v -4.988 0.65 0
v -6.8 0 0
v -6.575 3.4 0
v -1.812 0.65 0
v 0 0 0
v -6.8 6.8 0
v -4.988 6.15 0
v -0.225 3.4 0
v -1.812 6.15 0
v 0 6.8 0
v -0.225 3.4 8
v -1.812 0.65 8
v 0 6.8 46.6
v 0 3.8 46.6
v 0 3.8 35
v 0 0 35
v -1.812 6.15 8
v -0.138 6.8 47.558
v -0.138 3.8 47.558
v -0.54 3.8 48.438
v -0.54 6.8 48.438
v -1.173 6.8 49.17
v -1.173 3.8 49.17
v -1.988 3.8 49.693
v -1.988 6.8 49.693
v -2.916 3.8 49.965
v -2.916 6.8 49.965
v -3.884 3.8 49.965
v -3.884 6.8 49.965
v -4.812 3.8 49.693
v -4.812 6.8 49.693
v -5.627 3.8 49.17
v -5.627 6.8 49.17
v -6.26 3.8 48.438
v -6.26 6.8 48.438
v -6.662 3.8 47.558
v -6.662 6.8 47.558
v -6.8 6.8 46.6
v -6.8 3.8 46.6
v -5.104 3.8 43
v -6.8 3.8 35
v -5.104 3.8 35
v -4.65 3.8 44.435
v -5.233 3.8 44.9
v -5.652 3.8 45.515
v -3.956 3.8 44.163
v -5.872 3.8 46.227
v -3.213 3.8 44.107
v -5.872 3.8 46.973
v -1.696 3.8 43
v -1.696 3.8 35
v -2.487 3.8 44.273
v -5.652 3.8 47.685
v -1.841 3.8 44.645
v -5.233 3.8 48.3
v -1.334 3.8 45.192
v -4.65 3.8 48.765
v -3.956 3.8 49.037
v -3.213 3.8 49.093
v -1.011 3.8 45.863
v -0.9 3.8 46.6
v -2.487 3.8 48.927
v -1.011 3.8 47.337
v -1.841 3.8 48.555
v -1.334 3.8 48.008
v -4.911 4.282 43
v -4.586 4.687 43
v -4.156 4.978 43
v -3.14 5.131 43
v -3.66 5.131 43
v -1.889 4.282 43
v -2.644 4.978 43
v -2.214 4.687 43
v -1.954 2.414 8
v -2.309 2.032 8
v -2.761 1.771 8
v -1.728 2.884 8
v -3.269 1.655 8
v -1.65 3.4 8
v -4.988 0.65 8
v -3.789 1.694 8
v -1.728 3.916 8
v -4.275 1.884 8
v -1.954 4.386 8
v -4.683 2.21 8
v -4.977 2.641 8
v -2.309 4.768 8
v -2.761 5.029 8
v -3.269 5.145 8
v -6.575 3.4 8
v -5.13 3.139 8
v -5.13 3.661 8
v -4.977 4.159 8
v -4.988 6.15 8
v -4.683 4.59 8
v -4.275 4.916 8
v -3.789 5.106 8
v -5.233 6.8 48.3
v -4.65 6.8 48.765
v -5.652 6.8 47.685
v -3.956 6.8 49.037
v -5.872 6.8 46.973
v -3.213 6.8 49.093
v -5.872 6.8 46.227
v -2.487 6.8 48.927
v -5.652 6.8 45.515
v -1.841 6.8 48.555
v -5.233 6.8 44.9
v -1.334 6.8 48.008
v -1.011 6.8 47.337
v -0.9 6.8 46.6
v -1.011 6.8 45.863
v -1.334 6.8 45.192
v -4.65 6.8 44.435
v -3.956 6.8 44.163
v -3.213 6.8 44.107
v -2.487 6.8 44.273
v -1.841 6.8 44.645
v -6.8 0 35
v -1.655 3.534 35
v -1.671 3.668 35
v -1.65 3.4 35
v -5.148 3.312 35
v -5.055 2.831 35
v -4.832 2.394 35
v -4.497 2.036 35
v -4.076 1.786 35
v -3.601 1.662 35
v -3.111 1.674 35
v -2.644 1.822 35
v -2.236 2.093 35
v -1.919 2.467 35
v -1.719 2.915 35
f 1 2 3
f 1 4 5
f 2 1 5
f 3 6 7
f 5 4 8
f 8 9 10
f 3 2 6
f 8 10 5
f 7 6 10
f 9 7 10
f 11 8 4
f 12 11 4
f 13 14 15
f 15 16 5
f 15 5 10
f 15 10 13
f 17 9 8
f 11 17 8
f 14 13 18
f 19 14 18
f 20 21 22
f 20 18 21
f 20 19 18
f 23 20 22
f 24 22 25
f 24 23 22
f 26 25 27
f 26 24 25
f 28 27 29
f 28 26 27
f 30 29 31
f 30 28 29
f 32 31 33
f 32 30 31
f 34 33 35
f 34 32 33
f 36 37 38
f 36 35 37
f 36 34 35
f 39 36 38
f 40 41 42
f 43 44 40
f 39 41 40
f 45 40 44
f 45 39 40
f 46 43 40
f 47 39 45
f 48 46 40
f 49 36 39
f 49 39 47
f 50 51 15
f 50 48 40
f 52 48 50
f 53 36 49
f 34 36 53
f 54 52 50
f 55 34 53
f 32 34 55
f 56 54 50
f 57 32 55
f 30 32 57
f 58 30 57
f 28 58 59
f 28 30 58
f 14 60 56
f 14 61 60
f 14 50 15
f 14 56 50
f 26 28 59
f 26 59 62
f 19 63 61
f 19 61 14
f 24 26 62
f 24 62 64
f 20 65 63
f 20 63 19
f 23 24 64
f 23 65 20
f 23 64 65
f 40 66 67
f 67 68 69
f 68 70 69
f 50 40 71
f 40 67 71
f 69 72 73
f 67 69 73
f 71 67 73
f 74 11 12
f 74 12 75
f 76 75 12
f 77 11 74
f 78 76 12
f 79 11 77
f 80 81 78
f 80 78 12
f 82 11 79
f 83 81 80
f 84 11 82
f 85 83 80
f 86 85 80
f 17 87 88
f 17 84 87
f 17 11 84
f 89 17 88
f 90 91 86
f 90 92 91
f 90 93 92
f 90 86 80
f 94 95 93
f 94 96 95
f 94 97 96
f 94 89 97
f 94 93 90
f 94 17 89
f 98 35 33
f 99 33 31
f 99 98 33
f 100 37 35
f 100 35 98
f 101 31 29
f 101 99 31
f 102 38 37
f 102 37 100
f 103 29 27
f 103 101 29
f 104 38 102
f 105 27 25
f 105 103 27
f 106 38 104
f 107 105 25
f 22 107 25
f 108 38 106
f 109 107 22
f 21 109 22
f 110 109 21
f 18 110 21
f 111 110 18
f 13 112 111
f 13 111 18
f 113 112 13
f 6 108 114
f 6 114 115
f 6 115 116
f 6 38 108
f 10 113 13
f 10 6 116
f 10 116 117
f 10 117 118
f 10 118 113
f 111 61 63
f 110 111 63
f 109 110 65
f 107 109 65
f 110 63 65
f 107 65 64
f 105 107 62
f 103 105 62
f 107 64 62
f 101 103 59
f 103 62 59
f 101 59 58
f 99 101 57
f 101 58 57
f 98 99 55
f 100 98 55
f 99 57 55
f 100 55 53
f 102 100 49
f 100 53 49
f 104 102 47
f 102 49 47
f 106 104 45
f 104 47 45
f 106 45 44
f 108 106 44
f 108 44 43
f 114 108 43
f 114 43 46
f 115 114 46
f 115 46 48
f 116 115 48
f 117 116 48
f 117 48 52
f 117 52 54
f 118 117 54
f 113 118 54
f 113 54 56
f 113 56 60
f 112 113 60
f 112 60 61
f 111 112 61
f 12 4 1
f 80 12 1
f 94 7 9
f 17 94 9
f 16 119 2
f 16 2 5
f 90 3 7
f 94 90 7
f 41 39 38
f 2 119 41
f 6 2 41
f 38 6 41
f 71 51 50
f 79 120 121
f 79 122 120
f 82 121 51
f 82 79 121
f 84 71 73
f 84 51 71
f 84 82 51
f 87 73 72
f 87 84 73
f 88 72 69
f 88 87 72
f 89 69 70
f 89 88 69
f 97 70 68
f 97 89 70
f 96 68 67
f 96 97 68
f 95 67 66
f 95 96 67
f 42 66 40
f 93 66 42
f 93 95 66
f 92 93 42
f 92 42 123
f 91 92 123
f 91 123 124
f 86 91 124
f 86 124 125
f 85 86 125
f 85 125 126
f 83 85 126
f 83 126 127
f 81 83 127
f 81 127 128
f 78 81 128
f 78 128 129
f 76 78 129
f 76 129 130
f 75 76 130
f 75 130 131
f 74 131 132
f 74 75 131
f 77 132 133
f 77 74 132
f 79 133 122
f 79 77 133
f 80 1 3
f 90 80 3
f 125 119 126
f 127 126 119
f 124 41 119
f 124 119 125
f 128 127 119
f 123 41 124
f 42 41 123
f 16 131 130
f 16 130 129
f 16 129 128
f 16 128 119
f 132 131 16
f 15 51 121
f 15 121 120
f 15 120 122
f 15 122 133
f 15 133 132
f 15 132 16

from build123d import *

# Parameters (mm, degrees)
SKETCH1_W           = 6.8
SKETCH1_H           = 6.8
SKETCH1_R           = 1.75
BOSS_EXTRUDE1_DEPTH = 50
CUT_EXTRUDE1_DEPTH  = 8
SKETCH5_W           = 6.8
SKETCH5_H           = 6.8
BOSS_EXTRUDE2_DEPTH = 7
SKETCH3_W           = 6.8
SKETCH3_H           = 3.8
CUT_EXTRUDE2_DEPTH  = 15
SKETCH4_R           = 2.5
CUT_EXTRUDE3_DEPTH  = 20
FILLET3_RADIUS      = 3.4
FILLET3_LENGTH      = 3


with BuildPart() as part:
    # Sketch1 → Boss-Extrude1 (new body)
    with BuildSketch(Plane.XY):
        with Locations((-3.4, 3.4)):
            Rectangle(SKETCH1_W, SKETCH1_H)
        with Locations((-3.4, 3.4)):
            Circle(SKETCH1_R, mode=Mode.SUBTRACT)
    extrude(amount=BOSS_EXTRUDE1_DEPTH)

    # Sketch2 → Cut-Extrude1 (cut)
    with BuildSketch(Plane(origin=(0, 0, 0), x_dir=(-1, 0, 0), z_dir=(0, 0, -1))):
        Polygon((6.575426481, 3.4), (4.98771324, 6.15), (1.81228676, 6.15), (0.224573519, 3.4), (1.81228676, 0.65), (4.98771324, 0.65), align=None)
    extrude(amount=-CUT_EXTRUDE1_DEPTH, mode=Mode.SUBTRACT)

    # Sketch5 → Boss-Extrude2 (add)
    with BuildSketch(Plane.XY.offset(50)):
        with Locations((-3.4, 3.4)):
            Rectangle(SKETCH5_W, SKETCH5_H)
    extrude(amount=-BOSS_EXTRUDE2_DEPTH)

    # Sketch3 → Cut-Extrude2 (cut)
    with BuildSketch(Plane.XY.offset(50)):
        with Locations((-3.4, 1.9)):
            Rectangle(SKETCH3_W, SKETCH3_H)
    extrude(amount=-CUT_EXTRUDE2_DEPTH, mode=Mode.SUBTRACT)

    # Sketch4 → Cut-Extrude3 (cut)
    with BuildSketch(Plane.XZ.offset(-3.8)):
        with Locations((-3.4, 46.6)):
            Circle(SKETCH4_R)
    extrude(amount=-CUT_EXTRUDE3_DEPTH, mode=Mode.SUBTRACT)

    # Fillet3: full round fillet: the end face becomes a half cylinder, R = half its width
    fillet3_face = Plane((-3.4, 5.3, 50), x_dir=(0, -1, 0), z_dir=(0, 0, 1))  # on the end face: x along it, z out of the body
    fillet3_slab = fillet3_face.offset(-FILLET3_RADIUS / 2) * Box(FILLET3_LENGTH, 2 * FILLET3_RADIUS, FILLET3_RADIUS, mode=Mode.PRIVATE)  # the body's end, R deep
    fillet3_round = Plane((-3.4, 5.3, 46.6), x_dir=(0, 0, 1), z_dir=(0, -1, 0)) * Cylinder(FILLET3_RADIUS, FILLET3_LENGTH, mode=Mode.PRIVATE)  # its axis R under the face
    add(fillet3_slab - fillet3_round, mode=Mode.SUBTRACT)


solid = part.part
